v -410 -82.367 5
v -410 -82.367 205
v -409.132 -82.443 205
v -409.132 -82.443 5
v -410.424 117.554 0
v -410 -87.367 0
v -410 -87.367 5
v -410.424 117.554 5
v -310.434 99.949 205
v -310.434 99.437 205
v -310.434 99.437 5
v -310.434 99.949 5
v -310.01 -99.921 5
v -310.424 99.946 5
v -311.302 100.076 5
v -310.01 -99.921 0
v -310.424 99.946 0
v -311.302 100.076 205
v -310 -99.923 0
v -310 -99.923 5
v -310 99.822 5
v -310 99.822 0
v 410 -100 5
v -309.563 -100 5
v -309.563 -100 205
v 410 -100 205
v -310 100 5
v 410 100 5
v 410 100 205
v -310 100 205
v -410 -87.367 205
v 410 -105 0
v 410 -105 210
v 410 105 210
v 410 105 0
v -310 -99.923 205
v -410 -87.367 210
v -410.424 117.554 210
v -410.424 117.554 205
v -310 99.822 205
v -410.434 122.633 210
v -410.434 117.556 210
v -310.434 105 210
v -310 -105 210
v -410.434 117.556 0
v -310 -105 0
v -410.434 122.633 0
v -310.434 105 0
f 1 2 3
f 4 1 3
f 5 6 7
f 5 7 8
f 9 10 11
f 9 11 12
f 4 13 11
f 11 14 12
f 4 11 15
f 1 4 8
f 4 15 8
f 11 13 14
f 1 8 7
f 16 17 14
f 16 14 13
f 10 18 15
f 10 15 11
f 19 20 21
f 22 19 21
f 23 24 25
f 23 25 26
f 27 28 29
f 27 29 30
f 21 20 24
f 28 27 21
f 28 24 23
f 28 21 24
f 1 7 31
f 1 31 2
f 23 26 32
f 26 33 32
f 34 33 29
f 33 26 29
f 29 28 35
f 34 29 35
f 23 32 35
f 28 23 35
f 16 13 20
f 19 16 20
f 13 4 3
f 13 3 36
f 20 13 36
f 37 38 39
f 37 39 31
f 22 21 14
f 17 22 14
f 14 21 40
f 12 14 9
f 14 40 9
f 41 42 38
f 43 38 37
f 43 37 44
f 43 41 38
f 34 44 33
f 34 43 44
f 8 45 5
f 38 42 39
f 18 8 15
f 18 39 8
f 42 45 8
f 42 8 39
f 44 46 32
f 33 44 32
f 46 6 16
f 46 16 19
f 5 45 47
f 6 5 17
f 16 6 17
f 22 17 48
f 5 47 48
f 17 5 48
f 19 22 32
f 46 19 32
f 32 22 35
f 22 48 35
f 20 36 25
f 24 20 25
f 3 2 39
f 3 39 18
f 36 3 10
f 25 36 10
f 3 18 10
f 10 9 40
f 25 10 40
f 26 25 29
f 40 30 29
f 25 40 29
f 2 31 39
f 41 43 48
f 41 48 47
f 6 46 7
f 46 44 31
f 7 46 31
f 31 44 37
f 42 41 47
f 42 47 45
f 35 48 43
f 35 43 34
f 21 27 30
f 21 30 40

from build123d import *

# Parameters (mm, degrees)
SKETCH1_W           = 820
SKETCH1_H           = 210
BOSS_EXTRUDE1_DEPTH = 210
CUT_EXTRUDE5_DEPTH  = 336
BOSS_EXTRUDE2_DEPTH = 210
BOSS_EXTRUDE3_DEPTH = 5
BOSS_EXTRUDE4_DEPTH = 5
SHELL2_START        = 5
SHELL2_DEPTH        = 200


# Read off the part's stored shape, not the designer's step: Shell2
with BuildPart() as part:
    # Sketch1 → Boss-Extrude1 (new body)
    with BuildSketch(Plane.XY):
        Rectangle(SKETCH1_W, SKETCH1_H)
    extrude(amount=BOSS_EXTRUDE1_DEPTH)

    # Sketch2 → Cut-Extrude5 (cut)
    with BuildSketch(Plane.XY.offset(210)):
        Polygon((-409.131759112, -82.443263164), (-310, -99.922866941), (-310, 99.822096903), (-310.868240888, 100.075961235), (-338.793852416, 105), (-410, 105), (-410, -82.367301929), align=None)
        Polygon((-410, -105), (-310, -105), (-410, -87.367301929), align=None)
    extrude(amount=-CUT_EXTRUDE5_DEPTH, mode=Mode.SUBTRACT)

    # Sketch6 → Boss-Extrude2 (add, through all)
    with BuildSketch(Plane.XY.offset(210)):
        Polygon((-338.793852416, 105), (-310.434120444, 105), (-410.434120444, 122.632698071), (-410.434120444, 117.555565011), (-311.302361333, 100.075961235), (-310.434120444, 99.437059413), (-310.434120444, 99.949029069), (-310.868240888, 100.075961235), align=None)
    extrude(amount=-BOSS_EXTRUDE2_DEPTH)

    # Sketch8 → Boss-Extrude3 (add)
    with BuildSketch(Plane.XY.offset(210)):
        Polygon((-410, -87.367301929), (-310, -105), (410, -105), (410, 105), (-310.434120444, 105), (-410.434120444, 122.632698071), align=None)
    extrude(amount=-BOSS_EXTRUDE3_DEPTH)

    # Sketch9 → Boss-Extrude4 (add)
    with BuildSketch(Plane(origin=(0, 0, 0), x_dir=(-1, 0, 0), z_dir=(0, 0, -1))):
        Polygon((310.434120444, 105), (310, -105), (410, -87.367301929), (410.434120444, 122.632698071), align=None)
    extrude(amount=-BOSS_EXTRUDE4_DEPTH)

    # Shell2 outline → Shell2 (cut)
    with BuildSketch(Plane.XY.offset(SHELL2_START)):
        Polygon((410, 100), (-310, 100), (-310, -99.922866941), (-309.562556682, -100), (410, -100), align=None)
    extrude(amount=SHELL2_DEPTH, mode=Mode.SUBTRACT)


solid = part.part
